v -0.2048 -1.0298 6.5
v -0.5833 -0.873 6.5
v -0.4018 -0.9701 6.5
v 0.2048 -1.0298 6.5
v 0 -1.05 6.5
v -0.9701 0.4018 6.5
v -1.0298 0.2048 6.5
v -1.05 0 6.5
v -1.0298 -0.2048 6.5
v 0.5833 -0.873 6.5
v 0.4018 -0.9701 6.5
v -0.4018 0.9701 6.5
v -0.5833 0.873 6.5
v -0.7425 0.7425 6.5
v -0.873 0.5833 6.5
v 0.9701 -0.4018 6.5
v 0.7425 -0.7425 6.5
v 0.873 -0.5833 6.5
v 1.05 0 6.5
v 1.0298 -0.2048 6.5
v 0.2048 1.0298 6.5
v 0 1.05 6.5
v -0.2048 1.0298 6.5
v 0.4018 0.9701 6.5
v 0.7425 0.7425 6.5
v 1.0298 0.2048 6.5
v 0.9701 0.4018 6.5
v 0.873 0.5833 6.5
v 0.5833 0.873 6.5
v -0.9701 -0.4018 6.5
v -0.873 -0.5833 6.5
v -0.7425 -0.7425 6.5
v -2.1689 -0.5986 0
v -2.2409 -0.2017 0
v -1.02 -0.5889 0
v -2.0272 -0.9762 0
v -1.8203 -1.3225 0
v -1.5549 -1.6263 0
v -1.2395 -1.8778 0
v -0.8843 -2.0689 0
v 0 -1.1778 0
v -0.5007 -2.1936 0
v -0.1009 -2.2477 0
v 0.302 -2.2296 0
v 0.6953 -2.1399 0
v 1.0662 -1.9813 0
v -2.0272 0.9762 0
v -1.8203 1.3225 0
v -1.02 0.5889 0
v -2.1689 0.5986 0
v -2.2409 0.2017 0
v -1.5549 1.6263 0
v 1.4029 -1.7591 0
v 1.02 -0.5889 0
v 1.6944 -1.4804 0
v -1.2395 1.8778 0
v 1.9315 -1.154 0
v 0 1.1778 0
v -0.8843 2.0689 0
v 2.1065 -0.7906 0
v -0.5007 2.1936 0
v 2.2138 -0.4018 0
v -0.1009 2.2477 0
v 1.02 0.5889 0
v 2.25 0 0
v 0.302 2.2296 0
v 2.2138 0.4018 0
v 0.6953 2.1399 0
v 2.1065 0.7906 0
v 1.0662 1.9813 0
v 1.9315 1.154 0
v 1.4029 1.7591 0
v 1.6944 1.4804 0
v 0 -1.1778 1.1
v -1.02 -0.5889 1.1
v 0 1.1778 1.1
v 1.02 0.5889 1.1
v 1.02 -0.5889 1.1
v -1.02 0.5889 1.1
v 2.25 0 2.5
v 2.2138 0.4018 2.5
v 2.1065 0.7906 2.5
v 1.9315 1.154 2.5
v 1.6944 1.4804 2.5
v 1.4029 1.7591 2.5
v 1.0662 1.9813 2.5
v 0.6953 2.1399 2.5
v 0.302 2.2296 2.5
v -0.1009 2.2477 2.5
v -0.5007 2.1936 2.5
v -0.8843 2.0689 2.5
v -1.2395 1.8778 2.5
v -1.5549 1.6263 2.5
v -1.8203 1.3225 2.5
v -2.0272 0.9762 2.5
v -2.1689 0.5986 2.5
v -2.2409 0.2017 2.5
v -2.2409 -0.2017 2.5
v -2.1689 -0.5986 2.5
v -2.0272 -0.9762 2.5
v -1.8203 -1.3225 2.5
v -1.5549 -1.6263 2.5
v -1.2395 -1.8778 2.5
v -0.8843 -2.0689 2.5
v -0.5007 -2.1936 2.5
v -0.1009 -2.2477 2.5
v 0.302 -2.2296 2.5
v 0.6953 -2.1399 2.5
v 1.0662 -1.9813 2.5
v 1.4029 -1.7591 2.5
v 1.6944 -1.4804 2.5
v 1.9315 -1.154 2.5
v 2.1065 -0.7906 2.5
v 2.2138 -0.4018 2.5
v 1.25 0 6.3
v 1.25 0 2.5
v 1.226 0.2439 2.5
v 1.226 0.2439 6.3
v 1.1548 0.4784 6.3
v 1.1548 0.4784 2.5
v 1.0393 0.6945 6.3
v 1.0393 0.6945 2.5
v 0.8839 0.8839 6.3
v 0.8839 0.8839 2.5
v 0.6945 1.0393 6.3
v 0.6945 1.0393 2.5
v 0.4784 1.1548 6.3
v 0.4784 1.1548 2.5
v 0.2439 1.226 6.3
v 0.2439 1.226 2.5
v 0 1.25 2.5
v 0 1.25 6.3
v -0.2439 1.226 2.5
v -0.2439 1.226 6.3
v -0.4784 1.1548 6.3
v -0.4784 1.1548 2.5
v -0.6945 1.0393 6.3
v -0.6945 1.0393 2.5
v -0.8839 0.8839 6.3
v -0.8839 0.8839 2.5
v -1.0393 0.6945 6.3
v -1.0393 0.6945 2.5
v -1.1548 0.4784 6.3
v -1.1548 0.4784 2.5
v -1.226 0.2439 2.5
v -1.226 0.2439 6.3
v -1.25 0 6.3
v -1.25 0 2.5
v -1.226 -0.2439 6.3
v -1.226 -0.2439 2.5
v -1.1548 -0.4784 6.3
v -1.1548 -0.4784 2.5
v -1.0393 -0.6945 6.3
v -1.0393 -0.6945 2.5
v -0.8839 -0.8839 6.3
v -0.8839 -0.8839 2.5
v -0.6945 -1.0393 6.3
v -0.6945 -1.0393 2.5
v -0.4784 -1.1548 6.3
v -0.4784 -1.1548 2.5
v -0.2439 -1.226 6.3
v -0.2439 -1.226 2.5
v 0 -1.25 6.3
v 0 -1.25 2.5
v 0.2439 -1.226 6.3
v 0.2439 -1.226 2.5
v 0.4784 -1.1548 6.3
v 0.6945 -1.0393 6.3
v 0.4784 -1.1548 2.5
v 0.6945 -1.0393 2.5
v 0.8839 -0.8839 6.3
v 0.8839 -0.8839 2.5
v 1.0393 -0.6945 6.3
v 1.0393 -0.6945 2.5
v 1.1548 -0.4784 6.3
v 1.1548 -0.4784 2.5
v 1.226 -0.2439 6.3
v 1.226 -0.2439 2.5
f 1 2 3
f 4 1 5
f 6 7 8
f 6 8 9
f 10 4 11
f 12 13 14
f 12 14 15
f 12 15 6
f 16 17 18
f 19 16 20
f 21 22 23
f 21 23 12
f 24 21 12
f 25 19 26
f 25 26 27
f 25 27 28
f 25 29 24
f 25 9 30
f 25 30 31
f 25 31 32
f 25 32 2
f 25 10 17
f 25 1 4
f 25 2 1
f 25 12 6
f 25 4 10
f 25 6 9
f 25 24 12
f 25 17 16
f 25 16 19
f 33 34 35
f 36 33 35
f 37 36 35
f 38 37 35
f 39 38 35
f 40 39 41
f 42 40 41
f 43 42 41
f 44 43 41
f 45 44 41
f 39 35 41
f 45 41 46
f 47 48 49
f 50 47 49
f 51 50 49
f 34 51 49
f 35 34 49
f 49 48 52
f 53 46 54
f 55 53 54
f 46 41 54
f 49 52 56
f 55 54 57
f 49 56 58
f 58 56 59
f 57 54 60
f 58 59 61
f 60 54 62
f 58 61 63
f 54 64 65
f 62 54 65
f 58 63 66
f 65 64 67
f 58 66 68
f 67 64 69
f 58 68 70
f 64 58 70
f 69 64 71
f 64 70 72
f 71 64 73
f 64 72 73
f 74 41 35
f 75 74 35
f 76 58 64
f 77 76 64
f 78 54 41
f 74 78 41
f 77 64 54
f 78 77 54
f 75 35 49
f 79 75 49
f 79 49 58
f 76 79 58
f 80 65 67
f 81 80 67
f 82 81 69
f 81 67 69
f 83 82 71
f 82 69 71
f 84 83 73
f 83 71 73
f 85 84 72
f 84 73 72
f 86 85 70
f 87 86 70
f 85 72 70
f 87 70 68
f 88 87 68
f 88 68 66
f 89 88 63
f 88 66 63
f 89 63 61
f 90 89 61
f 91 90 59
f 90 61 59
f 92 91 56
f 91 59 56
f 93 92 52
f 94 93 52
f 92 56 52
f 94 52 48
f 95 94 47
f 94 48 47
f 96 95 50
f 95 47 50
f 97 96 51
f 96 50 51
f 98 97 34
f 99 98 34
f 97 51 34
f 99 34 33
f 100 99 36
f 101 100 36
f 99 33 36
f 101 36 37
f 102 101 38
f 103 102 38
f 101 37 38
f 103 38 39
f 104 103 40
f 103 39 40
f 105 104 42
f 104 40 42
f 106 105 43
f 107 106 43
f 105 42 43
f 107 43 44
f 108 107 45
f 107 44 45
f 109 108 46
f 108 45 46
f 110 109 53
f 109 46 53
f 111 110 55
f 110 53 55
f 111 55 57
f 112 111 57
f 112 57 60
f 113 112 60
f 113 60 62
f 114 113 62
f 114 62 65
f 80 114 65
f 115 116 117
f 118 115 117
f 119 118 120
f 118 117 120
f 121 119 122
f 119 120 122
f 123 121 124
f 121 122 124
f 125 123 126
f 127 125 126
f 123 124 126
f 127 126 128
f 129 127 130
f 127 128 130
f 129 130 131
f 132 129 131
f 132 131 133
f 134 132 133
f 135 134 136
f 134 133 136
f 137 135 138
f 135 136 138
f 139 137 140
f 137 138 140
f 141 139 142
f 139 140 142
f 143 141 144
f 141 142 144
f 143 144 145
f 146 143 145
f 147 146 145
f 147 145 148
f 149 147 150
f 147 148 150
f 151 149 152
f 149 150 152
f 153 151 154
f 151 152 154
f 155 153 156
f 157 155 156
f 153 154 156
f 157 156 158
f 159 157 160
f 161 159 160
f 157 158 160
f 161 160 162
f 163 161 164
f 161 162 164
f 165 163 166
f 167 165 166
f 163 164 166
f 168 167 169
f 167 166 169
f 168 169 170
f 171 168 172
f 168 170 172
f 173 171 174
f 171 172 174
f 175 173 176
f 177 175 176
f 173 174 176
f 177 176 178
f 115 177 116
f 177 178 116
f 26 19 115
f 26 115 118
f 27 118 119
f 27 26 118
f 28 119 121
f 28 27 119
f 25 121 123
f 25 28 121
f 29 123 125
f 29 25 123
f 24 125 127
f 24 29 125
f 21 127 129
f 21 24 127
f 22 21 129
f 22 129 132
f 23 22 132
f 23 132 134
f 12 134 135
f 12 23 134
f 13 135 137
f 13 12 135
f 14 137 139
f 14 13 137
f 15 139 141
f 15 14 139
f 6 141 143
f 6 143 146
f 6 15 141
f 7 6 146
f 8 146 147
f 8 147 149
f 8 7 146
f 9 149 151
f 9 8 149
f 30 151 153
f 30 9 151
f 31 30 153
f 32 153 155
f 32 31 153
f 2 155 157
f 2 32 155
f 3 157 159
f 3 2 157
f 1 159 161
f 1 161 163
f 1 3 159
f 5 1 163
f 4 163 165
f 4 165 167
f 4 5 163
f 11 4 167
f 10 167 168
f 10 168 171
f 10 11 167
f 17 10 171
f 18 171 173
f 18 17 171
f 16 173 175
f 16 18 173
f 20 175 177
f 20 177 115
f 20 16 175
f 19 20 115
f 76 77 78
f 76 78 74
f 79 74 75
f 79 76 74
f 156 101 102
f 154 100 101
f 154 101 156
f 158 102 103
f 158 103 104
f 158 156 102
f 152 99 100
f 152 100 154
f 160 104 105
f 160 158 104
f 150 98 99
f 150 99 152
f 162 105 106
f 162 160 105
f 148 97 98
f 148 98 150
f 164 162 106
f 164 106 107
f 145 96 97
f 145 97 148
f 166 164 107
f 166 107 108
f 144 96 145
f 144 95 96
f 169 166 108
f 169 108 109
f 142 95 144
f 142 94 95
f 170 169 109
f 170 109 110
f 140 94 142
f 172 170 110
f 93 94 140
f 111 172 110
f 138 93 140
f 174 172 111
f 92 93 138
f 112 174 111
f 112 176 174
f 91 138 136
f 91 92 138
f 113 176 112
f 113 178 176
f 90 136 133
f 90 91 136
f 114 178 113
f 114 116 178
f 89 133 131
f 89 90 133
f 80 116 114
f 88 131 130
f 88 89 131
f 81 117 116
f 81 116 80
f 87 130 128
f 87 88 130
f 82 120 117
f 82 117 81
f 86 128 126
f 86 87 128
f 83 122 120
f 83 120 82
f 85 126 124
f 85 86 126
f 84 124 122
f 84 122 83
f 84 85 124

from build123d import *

# Parameters (mm, degrees)
SKETCH_1_R          = 2.25
EXTRUDE_1_DEPTH     = 2.5
SKETCH_2_R          = 1.25
EXTRUDE_2_DEPTH     = 4
CHAMFER_1_SIZE      = 0.2
CUT_EXTRUDE_1_DEPTH = 1.1


with BuildPart() as part:
    # 草图1 → 凸台-拉伸1 (new body)
    with BuildSketch(Plane.XY):
        Circle(SKETCH_1_R)
    extrude(amount=EXTRUDE_1_DEPTH)

    # 草图2 → 凸台-拉伸2 (add)
    with BuildSketch(Plane.XY.offset(2.5)):
        Circle(SKETCH_2_R)
    extrude(amount=EXTRUDE_2_DEPTH)

    # 倒角1
    chamfer_1_edges = [part.edges().sort_by_distance(p)[0] for p in [
        (-1.25, 0, 6.5),
    ]]
    chamfer(chamfer_1_edges, length=CHAMFER_1_SIZE)

    # 草图3 → 切除-拉伸1 (cut)
    with BuildSketch(Plane(origin=(0, 0, 0), x_dir=(-1, 0, 0), z_dir=(0, 0, -1))):
        Polygon((0, 1.177794549), (-1.02, 0.588897275), (-1.02, -0.588897275), (0, -1.177794549), (1.02, -0.588897275), (1.02, 0.588897275), align=None)
    extrude(amount=-CUT_EXTRUDE_1_DEPTH, mode=Mode.SUBTRACT)


solid = part.part
